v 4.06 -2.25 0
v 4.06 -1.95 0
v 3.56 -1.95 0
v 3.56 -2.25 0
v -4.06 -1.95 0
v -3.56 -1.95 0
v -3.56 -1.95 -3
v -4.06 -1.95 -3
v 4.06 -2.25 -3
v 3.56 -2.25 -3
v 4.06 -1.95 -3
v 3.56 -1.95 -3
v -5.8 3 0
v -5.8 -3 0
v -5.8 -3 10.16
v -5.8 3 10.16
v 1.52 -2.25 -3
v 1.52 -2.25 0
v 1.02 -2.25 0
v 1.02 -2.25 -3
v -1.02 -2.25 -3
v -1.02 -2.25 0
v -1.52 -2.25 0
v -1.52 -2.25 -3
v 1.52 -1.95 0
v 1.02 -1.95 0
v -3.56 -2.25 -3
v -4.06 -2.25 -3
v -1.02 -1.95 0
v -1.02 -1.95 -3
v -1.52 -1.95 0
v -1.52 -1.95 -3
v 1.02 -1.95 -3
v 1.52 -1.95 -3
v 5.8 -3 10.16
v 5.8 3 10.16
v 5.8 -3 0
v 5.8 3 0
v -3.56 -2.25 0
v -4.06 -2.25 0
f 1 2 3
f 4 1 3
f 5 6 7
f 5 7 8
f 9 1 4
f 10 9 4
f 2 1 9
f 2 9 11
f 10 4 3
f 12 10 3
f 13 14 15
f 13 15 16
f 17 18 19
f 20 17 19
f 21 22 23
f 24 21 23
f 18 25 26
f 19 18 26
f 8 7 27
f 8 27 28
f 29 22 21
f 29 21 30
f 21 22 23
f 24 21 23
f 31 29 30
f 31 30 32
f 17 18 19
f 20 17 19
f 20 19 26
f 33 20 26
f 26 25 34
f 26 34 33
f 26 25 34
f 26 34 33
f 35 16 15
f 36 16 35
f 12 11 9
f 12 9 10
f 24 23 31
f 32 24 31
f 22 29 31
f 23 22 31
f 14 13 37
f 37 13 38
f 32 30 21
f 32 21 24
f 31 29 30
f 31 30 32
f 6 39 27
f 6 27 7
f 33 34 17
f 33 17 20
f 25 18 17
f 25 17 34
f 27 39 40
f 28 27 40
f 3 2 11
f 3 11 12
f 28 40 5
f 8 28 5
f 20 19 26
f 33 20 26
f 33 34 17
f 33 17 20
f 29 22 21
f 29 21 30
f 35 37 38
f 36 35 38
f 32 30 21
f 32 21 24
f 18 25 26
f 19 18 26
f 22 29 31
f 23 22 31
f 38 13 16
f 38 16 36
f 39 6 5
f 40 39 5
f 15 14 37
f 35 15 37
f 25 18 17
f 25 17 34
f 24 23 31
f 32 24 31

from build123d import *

# Parameters (mm, degrees)
SKETCH_1_W               = 11.6
SKETCH_1_H               = 6
EXTRUDE_1_DEPTH          = 10.16
SKETCH_2_W               = 0.5
SKETCH_2_H               = 0.3
EXTRUDE_2_DEPTH          = 3
PATTERN_LINEAR_1_COUNT   = 2
PATTERN_LINEAR_1_PITCH   = 2.54
PATTERN_LINEAR_1_2_COUNT = 3
PATTERN_LINEAR_1_2_PITCH = 2.54


with BuildPart() as part:
    # Эскиз1 → Бобышка-Вытянуть1 (new body)
    with BuildSketch(Plane.XY):
        Rectangle(SKETCH_1_W, SKETCH_1_H)
    extrude(amount=EXTRUDE_1_DEPTH)


with BuildPart() as body_2:
    # Эскиз2 → Бобышка-Вытянуть2 (new body)
    with BuildSketch(Plane(origin=(0, 0, 0), x_dir=(-1, 0, 0), z_dir=(0, 0, -1))):
        with Locations((1.27, -2.1)):
            Rectangle(SKETCH_2_W, SKETCH_2_H)
    extrude(amount=EXTRUDE_2_DEPTH)


with BuildPart() as pattern_linear_1_1:
    # Линейный массив1: pattern copy
    add(body_2.part.moved(Location(Vector(-1, 0, 0) * (1 * PATTERN_LINEAR_1_PITCH))))


with BuildPart() as pattern_linear_1_2_1:
    # Pattern Linear 1 2: pattern copy
    add(body_2.part.moved(Location(Vector(1, 0, 0) * (1 * PATTERN_LINEAR_1_2_PITCH))))


with BuildPart() as pattern_linear_1_2_2:
    # Pattern Linear 1 2: pattern copy
    add(body_2.part.moved(Location(Vector(1, 0, 0) * (2 * PATTERN_LINEAR_1_2_PITCH))))


with BuildPart() as pattern_linear_1_2_3:
    # Pattern Linear 1 2: pattern copy
    add(pattern_linear_1_1.part.moved(Location(Vector(1, 0, 0) * (1 * PATTERN_LINEAR_1_2_PITCH))))


with BuildPart() as pattern_linear_1_2_4:
    # Pattern Linear 1 2: pattern copy
    add(pattern_linear_1_1.part.moved(Location(Vector(1, 0, 0) * (2 * PATTERN_LINEAR_1_2_PITCH))))


solid = Compound([part.part, body_2.part, pattern_linear_1_1.part, pattern_linear_1_2_1.part, pattern_linear_1_2_2.part, pattern_linear_1_2_3.part, pattern_linear_1_2_4.part])
